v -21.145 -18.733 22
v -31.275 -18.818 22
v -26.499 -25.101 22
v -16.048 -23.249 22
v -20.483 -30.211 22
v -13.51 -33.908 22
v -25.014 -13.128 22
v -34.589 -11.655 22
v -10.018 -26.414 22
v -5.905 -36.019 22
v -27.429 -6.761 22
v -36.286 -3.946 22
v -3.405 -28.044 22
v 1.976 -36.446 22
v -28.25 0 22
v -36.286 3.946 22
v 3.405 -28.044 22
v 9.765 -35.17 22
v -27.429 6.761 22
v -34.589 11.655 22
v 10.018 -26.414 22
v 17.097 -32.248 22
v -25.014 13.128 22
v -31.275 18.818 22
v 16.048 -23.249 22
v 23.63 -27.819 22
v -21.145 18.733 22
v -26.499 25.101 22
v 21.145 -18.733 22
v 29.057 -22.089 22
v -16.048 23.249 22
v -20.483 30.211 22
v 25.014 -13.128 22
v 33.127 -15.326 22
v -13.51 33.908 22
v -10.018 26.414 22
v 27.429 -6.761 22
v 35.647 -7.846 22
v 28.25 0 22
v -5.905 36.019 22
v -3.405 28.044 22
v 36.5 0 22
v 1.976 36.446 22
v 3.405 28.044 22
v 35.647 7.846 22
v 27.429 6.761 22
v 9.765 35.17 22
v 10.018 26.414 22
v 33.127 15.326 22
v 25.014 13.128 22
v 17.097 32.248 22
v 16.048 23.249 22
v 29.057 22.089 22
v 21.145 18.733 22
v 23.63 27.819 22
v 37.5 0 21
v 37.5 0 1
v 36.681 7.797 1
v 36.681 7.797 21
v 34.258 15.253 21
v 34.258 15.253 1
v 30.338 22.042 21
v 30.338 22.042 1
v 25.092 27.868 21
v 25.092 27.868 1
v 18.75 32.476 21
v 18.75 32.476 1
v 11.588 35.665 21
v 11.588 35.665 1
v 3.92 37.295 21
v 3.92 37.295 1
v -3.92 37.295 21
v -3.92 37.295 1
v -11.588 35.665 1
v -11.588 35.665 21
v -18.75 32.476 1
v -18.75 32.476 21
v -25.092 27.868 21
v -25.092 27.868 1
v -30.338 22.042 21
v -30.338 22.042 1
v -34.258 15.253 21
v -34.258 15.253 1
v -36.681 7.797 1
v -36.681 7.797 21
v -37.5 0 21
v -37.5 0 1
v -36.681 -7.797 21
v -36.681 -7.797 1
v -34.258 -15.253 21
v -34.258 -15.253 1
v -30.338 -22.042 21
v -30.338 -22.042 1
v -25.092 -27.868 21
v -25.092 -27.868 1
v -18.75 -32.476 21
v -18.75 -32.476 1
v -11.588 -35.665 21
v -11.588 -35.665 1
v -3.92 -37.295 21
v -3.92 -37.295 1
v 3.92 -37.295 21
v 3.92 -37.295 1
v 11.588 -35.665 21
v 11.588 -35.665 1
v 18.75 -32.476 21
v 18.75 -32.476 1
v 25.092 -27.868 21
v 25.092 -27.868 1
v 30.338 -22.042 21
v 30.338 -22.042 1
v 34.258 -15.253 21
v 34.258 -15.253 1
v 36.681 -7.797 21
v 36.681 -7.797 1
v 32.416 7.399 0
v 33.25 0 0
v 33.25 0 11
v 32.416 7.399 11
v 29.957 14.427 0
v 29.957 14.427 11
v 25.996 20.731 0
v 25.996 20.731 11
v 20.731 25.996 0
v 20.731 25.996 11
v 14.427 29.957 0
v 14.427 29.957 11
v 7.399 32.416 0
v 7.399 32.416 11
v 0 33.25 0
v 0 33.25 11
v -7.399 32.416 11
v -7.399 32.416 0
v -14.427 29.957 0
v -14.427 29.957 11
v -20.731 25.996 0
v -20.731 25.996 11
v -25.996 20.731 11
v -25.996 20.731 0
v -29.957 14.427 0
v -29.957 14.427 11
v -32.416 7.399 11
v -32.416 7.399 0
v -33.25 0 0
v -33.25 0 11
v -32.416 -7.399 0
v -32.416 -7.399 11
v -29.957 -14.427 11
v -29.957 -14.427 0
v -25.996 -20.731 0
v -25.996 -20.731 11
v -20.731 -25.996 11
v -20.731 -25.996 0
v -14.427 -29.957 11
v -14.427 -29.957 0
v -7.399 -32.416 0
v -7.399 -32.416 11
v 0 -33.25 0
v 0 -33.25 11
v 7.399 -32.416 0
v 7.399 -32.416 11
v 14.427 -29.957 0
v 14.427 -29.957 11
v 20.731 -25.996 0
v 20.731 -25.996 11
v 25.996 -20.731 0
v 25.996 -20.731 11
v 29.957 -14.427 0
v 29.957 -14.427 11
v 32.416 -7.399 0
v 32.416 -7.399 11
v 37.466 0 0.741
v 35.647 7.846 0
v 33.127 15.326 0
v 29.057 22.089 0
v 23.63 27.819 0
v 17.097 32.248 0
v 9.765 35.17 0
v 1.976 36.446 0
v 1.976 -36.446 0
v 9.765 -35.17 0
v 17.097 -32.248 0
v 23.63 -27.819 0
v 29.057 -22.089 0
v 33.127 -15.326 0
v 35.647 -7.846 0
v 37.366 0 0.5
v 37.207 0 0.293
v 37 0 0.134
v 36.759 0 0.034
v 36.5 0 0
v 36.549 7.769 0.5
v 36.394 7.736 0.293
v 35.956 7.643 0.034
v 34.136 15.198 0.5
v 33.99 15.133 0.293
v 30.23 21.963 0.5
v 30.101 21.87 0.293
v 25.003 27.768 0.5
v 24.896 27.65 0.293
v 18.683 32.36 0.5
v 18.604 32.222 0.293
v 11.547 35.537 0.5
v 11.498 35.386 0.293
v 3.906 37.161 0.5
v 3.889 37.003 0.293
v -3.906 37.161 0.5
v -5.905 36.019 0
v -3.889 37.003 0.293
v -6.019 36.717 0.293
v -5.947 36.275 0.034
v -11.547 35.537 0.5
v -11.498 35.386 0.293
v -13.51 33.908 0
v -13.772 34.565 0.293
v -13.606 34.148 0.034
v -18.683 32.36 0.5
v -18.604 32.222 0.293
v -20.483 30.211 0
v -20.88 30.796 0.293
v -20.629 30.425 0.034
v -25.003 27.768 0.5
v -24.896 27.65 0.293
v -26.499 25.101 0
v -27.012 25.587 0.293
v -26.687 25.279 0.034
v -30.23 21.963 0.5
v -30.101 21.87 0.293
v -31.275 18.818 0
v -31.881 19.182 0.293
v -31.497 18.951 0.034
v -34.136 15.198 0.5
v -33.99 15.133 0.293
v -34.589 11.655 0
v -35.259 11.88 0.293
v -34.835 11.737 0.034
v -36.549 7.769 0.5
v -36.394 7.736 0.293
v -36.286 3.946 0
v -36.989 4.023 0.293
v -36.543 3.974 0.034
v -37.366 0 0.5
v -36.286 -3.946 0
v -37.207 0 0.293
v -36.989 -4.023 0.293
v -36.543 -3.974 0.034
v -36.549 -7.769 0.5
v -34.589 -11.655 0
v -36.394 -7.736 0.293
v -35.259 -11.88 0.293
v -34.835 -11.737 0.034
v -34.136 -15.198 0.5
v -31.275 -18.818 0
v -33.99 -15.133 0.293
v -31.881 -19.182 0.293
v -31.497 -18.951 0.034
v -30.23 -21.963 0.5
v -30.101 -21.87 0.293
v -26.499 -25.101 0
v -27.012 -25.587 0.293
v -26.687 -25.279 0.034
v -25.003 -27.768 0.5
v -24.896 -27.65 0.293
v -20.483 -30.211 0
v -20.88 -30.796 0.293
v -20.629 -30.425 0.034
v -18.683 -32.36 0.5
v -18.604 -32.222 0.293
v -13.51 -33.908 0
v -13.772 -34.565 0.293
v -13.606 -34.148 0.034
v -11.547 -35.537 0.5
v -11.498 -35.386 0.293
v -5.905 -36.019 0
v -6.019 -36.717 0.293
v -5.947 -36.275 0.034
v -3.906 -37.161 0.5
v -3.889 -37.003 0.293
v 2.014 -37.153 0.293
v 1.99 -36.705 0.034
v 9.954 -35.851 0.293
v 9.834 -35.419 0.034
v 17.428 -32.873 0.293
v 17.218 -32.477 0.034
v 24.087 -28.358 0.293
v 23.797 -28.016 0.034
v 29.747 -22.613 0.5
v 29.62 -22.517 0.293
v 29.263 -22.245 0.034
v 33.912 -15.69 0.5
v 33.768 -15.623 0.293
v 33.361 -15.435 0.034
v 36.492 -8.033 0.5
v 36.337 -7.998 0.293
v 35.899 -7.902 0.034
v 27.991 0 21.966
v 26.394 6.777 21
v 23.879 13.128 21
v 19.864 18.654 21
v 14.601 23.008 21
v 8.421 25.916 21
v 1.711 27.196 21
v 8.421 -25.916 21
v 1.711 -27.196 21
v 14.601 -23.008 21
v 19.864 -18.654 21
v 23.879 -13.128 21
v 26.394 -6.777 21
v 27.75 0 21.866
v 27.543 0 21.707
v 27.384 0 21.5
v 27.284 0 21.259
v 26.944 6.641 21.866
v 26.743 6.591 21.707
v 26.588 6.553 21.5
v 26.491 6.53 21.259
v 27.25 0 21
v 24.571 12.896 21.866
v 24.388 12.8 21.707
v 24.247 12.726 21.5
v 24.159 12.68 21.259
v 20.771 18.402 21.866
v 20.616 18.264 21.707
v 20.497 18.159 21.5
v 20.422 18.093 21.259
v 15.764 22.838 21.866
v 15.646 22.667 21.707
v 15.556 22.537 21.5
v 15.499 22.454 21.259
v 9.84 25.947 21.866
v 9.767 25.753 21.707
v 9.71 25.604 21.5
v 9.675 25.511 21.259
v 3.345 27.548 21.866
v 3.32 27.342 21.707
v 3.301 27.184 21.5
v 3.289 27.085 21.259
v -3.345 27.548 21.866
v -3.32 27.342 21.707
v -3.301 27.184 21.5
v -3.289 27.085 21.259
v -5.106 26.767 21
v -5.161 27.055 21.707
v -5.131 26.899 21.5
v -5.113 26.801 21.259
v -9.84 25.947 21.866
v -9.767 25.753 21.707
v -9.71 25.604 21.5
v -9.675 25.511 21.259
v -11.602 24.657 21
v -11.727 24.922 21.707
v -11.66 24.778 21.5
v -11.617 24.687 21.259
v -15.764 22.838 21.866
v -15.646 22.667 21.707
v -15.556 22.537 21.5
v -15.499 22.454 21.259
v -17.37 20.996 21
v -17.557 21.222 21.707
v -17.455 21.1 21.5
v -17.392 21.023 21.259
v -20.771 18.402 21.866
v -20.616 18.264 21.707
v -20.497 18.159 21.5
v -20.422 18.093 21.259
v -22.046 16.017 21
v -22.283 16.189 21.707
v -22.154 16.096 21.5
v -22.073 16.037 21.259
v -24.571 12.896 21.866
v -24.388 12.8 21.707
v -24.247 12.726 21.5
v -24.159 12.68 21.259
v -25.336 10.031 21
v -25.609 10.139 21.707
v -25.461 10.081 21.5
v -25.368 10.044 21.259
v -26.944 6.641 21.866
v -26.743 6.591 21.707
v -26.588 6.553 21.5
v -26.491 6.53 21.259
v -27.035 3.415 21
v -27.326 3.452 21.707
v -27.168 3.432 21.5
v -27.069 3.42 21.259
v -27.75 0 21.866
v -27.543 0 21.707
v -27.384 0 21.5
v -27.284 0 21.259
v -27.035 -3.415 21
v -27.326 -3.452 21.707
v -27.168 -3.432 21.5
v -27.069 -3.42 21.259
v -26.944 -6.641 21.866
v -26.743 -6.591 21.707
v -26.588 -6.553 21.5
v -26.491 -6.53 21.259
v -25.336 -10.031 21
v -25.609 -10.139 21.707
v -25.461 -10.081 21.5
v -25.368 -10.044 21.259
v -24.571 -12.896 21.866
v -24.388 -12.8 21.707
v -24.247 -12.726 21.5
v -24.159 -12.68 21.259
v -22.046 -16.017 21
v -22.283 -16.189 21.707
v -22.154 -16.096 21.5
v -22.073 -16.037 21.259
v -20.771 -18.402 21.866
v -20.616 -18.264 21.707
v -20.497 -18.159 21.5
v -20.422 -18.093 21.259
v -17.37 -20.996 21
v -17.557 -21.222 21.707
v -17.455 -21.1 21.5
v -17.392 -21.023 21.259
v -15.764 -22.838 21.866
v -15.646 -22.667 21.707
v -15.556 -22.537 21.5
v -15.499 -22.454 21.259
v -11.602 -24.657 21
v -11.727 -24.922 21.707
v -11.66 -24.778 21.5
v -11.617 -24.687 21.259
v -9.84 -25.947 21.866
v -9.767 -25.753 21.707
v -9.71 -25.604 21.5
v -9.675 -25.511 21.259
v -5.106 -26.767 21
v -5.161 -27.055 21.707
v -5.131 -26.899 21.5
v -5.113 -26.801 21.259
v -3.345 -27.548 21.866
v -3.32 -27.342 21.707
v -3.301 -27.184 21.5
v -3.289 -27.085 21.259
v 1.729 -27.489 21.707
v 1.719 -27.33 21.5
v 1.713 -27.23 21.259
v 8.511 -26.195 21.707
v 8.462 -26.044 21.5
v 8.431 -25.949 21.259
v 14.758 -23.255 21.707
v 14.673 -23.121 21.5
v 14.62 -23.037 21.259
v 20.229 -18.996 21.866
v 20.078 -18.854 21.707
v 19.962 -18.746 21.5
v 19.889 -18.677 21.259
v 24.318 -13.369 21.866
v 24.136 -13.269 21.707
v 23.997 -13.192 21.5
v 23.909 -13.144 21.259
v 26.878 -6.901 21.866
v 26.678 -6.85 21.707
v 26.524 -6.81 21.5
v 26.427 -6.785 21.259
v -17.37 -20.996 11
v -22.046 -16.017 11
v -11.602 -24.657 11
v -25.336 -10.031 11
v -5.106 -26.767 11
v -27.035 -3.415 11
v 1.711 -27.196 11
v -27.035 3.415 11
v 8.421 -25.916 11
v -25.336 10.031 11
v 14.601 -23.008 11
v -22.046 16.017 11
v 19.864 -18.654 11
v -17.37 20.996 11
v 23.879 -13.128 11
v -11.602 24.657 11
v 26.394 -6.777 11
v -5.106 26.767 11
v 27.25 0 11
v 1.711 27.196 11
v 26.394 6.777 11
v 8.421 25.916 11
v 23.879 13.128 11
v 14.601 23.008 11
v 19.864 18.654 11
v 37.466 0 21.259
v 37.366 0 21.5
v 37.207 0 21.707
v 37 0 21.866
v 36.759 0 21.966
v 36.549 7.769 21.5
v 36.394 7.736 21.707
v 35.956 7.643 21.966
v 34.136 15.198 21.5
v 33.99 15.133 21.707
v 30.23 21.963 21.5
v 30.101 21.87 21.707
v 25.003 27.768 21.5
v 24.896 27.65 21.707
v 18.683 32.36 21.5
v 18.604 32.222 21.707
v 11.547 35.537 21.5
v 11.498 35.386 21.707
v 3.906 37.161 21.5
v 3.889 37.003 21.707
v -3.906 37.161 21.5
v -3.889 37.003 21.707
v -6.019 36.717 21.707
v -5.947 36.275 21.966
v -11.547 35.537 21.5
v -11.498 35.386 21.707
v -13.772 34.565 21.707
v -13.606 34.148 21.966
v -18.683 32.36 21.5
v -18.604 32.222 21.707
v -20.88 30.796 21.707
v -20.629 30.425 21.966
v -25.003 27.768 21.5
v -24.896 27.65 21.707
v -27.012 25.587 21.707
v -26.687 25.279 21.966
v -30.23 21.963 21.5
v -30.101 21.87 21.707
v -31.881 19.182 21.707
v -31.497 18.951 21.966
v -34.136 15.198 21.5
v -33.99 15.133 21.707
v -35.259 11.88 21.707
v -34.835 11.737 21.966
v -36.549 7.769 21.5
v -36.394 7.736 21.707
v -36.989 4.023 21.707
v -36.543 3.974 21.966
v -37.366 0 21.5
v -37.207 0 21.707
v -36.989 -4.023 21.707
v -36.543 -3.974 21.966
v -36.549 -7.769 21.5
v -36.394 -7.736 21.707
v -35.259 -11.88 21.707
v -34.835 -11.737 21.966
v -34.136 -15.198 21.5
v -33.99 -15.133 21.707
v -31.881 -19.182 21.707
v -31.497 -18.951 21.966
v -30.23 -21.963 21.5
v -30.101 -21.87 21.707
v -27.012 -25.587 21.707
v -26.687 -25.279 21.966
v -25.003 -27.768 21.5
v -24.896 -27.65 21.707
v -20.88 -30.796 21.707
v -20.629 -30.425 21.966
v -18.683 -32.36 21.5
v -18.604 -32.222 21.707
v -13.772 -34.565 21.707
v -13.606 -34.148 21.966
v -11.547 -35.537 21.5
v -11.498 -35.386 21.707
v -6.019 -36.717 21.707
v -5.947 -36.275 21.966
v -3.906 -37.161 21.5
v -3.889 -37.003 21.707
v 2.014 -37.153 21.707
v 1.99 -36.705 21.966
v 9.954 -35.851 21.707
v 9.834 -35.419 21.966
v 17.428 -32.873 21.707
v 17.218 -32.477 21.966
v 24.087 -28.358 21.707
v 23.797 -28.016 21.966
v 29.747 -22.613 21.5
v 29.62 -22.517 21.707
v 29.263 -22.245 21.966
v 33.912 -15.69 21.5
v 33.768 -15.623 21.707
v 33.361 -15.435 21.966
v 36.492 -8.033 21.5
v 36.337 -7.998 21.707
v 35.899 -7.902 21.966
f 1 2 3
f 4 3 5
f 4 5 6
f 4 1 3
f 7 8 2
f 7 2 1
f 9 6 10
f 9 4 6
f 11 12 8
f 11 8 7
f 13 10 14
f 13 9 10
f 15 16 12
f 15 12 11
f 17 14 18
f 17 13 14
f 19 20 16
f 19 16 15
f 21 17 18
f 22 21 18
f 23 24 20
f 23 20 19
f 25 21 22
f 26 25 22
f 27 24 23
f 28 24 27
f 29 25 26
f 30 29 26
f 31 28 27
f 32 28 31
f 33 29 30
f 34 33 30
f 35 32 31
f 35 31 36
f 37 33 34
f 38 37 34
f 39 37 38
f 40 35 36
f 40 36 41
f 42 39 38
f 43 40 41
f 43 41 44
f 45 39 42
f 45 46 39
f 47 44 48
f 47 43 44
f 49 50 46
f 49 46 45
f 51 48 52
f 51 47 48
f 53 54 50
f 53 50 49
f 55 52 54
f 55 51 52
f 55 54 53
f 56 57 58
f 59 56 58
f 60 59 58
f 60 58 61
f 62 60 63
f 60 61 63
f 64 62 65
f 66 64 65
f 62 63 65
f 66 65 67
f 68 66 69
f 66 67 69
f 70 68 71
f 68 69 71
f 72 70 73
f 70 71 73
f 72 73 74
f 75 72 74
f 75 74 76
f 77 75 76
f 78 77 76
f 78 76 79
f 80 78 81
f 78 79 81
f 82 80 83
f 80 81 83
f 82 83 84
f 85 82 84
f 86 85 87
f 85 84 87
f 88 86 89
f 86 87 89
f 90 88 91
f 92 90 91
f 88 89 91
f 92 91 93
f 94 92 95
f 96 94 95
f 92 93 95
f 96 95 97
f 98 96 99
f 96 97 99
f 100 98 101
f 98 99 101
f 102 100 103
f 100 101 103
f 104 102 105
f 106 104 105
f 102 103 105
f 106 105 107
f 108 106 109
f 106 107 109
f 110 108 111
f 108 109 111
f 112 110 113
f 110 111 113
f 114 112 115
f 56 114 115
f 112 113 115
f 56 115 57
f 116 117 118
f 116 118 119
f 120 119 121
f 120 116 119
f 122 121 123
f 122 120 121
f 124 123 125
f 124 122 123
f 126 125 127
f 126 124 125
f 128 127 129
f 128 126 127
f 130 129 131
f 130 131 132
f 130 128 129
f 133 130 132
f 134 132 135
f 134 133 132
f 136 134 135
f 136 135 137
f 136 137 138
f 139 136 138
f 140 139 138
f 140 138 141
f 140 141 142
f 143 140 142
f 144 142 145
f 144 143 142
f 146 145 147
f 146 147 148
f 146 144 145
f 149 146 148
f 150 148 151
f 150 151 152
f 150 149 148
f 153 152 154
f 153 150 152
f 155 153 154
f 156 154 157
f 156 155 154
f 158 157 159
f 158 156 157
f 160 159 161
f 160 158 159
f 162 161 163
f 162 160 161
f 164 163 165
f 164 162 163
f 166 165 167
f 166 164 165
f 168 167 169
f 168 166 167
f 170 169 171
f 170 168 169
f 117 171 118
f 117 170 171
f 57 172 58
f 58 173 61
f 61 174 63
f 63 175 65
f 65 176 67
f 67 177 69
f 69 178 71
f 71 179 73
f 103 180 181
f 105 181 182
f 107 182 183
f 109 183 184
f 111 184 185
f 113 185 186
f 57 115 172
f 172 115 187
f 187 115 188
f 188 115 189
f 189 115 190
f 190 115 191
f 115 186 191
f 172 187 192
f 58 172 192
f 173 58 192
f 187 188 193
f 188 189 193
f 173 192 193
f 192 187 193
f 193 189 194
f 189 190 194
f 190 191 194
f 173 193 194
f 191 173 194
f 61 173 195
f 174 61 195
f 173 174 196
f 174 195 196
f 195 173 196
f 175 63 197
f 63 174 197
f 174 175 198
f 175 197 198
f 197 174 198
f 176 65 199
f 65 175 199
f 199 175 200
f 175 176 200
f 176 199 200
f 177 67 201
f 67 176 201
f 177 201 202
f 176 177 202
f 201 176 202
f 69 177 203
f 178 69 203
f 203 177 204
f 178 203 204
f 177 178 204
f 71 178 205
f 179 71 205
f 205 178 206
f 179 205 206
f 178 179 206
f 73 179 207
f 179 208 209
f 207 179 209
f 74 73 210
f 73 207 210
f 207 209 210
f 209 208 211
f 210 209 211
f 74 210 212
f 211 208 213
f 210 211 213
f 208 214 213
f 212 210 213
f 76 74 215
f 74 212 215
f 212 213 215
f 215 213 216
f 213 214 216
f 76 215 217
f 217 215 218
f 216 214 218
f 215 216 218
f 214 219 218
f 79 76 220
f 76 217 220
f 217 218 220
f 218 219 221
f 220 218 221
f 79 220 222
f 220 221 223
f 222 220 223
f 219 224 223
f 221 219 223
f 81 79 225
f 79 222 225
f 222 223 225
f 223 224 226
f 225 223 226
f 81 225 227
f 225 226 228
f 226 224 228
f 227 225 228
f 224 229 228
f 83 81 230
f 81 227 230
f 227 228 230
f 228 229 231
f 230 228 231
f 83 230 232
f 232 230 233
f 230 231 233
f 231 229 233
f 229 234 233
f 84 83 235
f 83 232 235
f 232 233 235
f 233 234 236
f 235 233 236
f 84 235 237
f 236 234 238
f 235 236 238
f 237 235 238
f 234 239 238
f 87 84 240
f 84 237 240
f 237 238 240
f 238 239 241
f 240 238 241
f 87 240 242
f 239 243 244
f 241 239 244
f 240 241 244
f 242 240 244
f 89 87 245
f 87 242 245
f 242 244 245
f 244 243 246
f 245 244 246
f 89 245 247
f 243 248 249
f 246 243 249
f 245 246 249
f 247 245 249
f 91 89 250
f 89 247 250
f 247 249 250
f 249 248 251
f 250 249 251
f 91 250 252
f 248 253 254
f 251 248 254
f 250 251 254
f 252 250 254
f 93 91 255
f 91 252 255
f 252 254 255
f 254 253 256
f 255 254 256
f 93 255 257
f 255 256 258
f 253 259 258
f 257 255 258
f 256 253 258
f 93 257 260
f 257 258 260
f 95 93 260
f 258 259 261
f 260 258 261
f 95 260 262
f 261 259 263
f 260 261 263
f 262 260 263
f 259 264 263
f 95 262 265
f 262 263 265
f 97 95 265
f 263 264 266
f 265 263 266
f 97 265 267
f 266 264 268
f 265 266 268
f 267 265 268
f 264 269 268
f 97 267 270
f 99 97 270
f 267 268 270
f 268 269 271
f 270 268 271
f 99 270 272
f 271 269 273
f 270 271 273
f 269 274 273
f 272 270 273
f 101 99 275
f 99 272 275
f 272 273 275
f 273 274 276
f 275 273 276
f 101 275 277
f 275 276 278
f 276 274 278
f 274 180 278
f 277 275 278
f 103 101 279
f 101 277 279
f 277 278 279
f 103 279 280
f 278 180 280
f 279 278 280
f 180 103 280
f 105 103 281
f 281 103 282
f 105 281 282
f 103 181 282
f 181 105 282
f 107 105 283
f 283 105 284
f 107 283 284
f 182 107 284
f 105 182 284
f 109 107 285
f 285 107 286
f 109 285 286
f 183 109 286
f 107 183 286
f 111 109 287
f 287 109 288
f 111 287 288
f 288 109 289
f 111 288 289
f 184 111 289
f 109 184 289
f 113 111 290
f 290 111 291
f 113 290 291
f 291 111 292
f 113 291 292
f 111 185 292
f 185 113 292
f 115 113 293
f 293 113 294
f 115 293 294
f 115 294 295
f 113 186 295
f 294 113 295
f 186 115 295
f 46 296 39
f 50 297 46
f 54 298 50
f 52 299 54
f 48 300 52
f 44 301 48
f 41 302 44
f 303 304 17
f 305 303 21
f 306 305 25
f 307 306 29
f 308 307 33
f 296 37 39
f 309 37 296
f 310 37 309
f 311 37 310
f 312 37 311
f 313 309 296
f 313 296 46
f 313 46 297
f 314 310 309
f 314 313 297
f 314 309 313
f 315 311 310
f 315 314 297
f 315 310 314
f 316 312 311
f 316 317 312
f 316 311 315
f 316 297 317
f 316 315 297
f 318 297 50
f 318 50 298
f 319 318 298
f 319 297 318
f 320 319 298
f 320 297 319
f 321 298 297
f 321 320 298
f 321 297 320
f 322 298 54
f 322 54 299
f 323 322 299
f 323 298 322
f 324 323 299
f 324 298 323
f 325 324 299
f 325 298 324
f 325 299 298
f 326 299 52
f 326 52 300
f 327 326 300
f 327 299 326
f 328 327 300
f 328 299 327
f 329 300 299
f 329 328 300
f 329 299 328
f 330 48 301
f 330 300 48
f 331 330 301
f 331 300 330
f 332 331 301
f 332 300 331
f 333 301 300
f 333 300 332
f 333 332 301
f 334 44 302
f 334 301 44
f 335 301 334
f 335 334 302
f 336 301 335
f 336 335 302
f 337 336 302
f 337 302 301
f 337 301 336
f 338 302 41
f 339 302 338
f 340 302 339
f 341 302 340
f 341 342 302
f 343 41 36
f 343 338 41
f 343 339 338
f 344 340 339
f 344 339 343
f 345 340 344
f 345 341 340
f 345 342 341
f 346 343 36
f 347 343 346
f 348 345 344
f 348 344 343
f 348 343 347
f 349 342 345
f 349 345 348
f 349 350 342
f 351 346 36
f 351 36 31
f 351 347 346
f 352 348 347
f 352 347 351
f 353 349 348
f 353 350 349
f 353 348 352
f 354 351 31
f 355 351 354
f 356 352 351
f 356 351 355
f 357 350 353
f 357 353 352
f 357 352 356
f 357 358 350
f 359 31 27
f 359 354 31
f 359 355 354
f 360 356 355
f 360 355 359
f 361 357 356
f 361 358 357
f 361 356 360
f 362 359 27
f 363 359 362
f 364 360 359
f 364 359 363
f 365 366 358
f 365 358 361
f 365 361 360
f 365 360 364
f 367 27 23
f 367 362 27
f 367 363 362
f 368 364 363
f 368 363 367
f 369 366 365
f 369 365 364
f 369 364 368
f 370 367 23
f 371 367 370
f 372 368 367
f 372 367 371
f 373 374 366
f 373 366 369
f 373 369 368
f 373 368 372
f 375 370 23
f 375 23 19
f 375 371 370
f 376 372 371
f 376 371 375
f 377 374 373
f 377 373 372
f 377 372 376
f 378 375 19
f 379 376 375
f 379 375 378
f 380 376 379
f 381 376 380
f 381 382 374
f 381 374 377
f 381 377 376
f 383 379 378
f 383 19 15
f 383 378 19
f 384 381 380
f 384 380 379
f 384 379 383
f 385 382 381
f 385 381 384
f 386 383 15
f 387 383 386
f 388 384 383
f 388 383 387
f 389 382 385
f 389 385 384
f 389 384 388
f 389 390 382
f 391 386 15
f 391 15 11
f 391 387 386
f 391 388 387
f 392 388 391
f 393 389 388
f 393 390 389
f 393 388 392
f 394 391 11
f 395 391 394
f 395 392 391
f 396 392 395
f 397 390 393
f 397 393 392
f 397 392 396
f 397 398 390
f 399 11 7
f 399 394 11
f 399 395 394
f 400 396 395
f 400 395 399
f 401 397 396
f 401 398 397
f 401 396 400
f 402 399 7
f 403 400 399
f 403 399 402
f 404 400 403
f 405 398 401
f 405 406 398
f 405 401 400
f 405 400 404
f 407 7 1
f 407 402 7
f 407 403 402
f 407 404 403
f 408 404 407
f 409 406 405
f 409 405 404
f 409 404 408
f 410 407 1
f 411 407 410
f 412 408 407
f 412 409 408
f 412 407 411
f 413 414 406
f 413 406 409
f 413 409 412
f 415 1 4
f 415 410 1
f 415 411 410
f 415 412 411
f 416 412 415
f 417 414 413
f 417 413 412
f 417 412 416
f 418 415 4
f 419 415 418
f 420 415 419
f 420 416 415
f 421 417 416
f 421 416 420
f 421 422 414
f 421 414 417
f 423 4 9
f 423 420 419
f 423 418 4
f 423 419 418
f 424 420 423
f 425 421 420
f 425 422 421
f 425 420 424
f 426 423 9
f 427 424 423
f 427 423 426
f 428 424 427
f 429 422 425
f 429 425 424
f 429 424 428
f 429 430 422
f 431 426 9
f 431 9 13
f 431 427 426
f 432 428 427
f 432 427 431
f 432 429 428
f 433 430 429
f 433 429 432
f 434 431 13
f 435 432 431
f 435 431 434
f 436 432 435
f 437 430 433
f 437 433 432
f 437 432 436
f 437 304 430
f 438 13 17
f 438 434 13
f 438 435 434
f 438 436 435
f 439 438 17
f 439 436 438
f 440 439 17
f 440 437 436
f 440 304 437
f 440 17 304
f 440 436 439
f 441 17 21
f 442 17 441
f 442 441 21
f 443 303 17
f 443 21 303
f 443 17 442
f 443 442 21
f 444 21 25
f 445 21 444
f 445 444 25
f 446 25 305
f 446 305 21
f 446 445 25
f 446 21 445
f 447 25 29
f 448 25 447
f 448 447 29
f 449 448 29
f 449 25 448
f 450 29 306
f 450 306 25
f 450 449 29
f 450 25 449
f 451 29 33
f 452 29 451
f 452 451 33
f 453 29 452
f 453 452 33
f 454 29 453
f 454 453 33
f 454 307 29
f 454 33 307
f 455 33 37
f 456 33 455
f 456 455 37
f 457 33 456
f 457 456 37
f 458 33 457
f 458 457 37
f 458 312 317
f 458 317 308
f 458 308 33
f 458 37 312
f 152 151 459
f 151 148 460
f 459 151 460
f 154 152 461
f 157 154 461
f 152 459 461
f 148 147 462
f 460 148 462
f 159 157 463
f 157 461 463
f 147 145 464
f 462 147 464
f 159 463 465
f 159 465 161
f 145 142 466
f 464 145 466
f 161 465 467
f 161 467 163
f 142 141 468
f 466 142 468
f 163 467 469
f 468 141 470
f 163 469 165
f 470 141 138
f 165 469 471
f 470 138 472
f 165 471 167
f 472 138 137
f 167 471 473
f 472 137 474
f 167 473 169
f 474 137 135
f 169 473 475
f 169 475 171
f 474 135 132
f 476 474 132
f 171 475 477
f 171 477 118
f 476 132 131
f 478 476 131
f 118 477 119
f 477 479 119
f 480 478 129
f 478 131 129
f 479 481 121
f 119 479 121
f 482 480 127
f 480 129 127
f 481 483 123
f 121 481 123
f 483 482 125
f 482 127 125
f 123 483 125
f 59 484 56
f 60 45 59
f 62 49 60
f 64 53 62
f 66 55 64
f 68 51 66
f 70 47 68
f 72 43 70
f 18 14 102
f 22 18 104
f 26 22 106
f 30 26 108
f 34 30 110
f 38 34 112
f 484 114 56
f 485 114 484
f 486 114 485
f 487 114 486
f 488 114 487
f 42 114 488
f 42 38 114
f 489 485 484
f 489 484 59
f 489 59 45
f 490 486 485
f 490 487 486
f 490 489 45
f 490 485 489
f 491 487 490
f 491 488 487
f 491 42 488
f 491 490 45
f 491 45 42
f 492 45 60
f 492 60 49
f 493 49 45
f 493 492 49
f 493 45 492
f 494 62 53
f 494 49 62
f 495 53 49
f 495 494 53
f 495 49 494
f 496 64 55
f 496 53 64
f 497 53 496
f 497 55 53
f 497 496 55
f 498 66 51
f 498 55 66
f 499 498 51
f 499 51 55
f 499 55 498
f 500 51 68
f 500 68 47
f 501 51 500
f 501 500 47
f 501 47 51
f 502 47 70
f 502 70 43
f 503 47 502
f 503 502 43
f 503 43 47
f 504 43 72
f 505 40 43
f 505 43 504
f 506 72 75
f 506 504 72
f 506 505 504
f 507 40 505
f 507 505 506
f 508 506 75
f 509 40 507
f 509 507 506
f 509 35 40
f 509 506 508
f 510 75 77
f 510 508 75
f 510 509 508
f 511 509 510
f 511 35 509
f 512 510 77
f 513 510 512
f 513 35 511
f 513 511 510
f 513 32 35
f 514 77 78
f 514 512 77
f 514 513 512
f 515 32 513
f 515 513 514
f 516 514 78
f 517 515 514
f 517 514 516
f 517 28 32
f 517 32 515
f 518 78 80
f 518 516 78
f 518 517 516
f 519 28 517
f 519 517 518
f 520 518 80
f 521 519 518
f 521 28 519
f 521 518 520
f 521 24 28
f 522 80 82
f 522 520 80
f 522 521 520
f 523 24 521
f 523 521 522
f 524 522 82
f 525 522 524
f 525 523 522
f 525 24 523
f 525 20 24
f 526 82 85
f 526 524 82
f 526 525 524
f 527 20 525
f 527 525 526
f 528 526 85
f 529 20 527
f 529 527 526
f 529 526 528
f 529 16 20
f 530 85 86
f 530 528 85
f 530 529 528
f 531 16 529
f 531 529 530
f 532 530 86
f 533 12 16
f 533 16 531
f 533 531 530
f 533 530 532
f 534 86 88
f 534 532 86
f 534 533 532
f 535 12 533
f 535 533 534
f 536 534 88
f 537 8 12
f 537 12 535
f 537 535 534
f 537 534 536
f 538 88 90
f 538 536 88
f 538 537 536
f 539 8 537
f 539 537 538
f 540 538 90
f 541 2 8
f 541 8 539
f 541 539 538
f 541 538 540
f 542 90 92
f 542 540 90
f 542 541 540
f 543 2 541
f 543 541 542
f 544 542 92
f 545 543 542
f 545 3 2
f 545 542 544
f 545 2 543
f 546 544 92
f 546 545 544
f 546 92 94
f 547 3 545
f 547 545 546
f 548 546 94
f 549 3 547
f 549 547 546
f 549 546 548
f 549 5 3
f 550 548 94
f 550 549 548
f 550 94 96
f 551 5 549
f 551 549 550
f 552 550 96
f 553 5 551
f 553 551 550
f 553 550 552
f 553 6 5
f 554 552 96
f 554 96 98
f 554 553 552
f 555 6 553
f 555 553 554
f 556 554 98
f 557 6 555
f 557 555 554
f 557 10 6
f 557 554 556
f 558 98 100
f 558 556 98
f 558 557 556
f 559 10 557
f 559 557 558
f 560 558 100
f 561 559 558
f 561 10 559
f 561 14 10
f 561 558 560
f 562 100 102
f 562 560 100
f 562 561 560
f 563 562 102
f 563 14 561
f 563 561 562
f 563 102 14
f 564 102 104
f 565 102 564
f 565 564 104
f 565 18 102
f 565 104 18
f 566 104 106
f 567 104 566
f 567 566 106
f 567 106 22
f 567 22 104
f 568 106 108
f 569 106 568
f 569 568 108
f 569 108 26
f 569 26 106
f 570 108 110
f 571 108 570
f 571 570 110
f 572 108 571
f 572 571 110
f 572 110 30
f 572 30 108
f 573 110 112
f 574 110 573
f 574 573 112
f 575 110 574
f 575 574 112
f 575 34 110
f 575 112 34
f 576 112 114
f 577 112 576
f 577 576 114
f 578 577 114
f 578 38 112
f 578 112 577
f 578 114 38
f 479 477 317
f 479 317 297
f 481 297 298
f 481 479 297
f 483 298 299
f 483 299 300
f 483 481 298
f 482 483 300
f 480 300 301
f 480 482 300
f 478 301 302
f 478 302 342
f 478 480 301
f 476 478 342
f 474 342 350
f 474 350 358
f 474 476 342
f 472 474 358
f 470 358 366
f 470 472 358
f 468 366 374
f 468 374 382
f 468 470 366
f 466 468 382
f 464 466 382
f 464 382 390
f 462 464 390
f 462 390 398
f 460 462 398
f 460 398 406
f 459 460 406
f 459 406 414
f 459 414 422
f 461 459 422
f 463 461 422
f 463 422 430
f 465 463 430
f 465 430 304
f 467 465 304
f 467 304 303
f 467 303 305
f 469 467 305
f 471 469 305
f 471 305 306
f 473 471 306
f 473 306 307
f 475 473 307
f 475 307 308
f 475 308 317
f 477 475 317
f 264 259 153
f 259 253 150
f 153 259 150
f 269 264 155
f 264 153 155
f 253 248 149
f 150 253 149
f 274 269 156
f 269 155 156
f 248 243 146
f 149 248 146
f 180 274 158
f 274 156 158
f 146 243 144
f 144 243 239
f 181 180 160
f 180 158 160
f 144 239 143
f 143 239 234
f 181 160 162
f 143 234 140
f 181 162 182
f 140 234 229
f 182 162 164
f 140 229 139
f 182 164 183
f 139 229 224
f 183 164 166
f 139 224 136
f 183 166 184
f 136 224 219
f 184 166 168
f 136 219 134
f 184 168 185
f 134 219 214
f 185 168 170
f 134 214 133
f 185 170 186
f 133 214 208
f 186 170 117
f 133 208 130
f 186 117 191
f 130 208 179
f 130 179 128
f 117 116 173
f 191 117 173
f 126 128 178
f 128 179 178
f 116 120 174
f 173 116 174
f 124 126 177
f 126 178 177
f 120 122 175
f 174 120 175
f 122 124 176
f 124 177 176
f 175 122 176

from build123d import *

# Parameters (mm, degrees)
F2_R     = 37.5
F2_R_2   = 33.25
F2_R_3   = 27.25
F3_DEPTH = 22
F4_DEPTH = 11
F5_R     = 1


# Not quite as in the source:
# - a feature of the source that left no trace in its solid (it failed there, or was rolled back) is left out


with BuildPart() as f3:
    # F2 (on Top) → F3 (new body)
    with BuildSketch(Plane.XY):
        Circle(F2_R)
        Circle(F2_R_2, mode=Mode.SUBTRACT)
        Circle(F2_R_2)
        Circle(F2_R_3, mode=Mode.SUBTRACT)
    extrude(amount=F3_DEPTH)

    # F2 (on Top) → F4 (cut)
    with BuildSketch(Plane.XY):
        Circle(F2_R_2)
        Circle(F2_R_3, mode=Mode.SUBTRACT)
    extrude(amount=F4_DEPTH, mode=Mode.SUBTRACT)

    # F5
    f5_edges = [f3.edges().sort_by_distance(p)[0] for p in [
        (-37.5, 0, 22),
        (-27.25, 0, 22),
        (-37.5, 0, 0),
    ]]
    fillet(f5_edges, radius=F5_R)


solid = f3.part
